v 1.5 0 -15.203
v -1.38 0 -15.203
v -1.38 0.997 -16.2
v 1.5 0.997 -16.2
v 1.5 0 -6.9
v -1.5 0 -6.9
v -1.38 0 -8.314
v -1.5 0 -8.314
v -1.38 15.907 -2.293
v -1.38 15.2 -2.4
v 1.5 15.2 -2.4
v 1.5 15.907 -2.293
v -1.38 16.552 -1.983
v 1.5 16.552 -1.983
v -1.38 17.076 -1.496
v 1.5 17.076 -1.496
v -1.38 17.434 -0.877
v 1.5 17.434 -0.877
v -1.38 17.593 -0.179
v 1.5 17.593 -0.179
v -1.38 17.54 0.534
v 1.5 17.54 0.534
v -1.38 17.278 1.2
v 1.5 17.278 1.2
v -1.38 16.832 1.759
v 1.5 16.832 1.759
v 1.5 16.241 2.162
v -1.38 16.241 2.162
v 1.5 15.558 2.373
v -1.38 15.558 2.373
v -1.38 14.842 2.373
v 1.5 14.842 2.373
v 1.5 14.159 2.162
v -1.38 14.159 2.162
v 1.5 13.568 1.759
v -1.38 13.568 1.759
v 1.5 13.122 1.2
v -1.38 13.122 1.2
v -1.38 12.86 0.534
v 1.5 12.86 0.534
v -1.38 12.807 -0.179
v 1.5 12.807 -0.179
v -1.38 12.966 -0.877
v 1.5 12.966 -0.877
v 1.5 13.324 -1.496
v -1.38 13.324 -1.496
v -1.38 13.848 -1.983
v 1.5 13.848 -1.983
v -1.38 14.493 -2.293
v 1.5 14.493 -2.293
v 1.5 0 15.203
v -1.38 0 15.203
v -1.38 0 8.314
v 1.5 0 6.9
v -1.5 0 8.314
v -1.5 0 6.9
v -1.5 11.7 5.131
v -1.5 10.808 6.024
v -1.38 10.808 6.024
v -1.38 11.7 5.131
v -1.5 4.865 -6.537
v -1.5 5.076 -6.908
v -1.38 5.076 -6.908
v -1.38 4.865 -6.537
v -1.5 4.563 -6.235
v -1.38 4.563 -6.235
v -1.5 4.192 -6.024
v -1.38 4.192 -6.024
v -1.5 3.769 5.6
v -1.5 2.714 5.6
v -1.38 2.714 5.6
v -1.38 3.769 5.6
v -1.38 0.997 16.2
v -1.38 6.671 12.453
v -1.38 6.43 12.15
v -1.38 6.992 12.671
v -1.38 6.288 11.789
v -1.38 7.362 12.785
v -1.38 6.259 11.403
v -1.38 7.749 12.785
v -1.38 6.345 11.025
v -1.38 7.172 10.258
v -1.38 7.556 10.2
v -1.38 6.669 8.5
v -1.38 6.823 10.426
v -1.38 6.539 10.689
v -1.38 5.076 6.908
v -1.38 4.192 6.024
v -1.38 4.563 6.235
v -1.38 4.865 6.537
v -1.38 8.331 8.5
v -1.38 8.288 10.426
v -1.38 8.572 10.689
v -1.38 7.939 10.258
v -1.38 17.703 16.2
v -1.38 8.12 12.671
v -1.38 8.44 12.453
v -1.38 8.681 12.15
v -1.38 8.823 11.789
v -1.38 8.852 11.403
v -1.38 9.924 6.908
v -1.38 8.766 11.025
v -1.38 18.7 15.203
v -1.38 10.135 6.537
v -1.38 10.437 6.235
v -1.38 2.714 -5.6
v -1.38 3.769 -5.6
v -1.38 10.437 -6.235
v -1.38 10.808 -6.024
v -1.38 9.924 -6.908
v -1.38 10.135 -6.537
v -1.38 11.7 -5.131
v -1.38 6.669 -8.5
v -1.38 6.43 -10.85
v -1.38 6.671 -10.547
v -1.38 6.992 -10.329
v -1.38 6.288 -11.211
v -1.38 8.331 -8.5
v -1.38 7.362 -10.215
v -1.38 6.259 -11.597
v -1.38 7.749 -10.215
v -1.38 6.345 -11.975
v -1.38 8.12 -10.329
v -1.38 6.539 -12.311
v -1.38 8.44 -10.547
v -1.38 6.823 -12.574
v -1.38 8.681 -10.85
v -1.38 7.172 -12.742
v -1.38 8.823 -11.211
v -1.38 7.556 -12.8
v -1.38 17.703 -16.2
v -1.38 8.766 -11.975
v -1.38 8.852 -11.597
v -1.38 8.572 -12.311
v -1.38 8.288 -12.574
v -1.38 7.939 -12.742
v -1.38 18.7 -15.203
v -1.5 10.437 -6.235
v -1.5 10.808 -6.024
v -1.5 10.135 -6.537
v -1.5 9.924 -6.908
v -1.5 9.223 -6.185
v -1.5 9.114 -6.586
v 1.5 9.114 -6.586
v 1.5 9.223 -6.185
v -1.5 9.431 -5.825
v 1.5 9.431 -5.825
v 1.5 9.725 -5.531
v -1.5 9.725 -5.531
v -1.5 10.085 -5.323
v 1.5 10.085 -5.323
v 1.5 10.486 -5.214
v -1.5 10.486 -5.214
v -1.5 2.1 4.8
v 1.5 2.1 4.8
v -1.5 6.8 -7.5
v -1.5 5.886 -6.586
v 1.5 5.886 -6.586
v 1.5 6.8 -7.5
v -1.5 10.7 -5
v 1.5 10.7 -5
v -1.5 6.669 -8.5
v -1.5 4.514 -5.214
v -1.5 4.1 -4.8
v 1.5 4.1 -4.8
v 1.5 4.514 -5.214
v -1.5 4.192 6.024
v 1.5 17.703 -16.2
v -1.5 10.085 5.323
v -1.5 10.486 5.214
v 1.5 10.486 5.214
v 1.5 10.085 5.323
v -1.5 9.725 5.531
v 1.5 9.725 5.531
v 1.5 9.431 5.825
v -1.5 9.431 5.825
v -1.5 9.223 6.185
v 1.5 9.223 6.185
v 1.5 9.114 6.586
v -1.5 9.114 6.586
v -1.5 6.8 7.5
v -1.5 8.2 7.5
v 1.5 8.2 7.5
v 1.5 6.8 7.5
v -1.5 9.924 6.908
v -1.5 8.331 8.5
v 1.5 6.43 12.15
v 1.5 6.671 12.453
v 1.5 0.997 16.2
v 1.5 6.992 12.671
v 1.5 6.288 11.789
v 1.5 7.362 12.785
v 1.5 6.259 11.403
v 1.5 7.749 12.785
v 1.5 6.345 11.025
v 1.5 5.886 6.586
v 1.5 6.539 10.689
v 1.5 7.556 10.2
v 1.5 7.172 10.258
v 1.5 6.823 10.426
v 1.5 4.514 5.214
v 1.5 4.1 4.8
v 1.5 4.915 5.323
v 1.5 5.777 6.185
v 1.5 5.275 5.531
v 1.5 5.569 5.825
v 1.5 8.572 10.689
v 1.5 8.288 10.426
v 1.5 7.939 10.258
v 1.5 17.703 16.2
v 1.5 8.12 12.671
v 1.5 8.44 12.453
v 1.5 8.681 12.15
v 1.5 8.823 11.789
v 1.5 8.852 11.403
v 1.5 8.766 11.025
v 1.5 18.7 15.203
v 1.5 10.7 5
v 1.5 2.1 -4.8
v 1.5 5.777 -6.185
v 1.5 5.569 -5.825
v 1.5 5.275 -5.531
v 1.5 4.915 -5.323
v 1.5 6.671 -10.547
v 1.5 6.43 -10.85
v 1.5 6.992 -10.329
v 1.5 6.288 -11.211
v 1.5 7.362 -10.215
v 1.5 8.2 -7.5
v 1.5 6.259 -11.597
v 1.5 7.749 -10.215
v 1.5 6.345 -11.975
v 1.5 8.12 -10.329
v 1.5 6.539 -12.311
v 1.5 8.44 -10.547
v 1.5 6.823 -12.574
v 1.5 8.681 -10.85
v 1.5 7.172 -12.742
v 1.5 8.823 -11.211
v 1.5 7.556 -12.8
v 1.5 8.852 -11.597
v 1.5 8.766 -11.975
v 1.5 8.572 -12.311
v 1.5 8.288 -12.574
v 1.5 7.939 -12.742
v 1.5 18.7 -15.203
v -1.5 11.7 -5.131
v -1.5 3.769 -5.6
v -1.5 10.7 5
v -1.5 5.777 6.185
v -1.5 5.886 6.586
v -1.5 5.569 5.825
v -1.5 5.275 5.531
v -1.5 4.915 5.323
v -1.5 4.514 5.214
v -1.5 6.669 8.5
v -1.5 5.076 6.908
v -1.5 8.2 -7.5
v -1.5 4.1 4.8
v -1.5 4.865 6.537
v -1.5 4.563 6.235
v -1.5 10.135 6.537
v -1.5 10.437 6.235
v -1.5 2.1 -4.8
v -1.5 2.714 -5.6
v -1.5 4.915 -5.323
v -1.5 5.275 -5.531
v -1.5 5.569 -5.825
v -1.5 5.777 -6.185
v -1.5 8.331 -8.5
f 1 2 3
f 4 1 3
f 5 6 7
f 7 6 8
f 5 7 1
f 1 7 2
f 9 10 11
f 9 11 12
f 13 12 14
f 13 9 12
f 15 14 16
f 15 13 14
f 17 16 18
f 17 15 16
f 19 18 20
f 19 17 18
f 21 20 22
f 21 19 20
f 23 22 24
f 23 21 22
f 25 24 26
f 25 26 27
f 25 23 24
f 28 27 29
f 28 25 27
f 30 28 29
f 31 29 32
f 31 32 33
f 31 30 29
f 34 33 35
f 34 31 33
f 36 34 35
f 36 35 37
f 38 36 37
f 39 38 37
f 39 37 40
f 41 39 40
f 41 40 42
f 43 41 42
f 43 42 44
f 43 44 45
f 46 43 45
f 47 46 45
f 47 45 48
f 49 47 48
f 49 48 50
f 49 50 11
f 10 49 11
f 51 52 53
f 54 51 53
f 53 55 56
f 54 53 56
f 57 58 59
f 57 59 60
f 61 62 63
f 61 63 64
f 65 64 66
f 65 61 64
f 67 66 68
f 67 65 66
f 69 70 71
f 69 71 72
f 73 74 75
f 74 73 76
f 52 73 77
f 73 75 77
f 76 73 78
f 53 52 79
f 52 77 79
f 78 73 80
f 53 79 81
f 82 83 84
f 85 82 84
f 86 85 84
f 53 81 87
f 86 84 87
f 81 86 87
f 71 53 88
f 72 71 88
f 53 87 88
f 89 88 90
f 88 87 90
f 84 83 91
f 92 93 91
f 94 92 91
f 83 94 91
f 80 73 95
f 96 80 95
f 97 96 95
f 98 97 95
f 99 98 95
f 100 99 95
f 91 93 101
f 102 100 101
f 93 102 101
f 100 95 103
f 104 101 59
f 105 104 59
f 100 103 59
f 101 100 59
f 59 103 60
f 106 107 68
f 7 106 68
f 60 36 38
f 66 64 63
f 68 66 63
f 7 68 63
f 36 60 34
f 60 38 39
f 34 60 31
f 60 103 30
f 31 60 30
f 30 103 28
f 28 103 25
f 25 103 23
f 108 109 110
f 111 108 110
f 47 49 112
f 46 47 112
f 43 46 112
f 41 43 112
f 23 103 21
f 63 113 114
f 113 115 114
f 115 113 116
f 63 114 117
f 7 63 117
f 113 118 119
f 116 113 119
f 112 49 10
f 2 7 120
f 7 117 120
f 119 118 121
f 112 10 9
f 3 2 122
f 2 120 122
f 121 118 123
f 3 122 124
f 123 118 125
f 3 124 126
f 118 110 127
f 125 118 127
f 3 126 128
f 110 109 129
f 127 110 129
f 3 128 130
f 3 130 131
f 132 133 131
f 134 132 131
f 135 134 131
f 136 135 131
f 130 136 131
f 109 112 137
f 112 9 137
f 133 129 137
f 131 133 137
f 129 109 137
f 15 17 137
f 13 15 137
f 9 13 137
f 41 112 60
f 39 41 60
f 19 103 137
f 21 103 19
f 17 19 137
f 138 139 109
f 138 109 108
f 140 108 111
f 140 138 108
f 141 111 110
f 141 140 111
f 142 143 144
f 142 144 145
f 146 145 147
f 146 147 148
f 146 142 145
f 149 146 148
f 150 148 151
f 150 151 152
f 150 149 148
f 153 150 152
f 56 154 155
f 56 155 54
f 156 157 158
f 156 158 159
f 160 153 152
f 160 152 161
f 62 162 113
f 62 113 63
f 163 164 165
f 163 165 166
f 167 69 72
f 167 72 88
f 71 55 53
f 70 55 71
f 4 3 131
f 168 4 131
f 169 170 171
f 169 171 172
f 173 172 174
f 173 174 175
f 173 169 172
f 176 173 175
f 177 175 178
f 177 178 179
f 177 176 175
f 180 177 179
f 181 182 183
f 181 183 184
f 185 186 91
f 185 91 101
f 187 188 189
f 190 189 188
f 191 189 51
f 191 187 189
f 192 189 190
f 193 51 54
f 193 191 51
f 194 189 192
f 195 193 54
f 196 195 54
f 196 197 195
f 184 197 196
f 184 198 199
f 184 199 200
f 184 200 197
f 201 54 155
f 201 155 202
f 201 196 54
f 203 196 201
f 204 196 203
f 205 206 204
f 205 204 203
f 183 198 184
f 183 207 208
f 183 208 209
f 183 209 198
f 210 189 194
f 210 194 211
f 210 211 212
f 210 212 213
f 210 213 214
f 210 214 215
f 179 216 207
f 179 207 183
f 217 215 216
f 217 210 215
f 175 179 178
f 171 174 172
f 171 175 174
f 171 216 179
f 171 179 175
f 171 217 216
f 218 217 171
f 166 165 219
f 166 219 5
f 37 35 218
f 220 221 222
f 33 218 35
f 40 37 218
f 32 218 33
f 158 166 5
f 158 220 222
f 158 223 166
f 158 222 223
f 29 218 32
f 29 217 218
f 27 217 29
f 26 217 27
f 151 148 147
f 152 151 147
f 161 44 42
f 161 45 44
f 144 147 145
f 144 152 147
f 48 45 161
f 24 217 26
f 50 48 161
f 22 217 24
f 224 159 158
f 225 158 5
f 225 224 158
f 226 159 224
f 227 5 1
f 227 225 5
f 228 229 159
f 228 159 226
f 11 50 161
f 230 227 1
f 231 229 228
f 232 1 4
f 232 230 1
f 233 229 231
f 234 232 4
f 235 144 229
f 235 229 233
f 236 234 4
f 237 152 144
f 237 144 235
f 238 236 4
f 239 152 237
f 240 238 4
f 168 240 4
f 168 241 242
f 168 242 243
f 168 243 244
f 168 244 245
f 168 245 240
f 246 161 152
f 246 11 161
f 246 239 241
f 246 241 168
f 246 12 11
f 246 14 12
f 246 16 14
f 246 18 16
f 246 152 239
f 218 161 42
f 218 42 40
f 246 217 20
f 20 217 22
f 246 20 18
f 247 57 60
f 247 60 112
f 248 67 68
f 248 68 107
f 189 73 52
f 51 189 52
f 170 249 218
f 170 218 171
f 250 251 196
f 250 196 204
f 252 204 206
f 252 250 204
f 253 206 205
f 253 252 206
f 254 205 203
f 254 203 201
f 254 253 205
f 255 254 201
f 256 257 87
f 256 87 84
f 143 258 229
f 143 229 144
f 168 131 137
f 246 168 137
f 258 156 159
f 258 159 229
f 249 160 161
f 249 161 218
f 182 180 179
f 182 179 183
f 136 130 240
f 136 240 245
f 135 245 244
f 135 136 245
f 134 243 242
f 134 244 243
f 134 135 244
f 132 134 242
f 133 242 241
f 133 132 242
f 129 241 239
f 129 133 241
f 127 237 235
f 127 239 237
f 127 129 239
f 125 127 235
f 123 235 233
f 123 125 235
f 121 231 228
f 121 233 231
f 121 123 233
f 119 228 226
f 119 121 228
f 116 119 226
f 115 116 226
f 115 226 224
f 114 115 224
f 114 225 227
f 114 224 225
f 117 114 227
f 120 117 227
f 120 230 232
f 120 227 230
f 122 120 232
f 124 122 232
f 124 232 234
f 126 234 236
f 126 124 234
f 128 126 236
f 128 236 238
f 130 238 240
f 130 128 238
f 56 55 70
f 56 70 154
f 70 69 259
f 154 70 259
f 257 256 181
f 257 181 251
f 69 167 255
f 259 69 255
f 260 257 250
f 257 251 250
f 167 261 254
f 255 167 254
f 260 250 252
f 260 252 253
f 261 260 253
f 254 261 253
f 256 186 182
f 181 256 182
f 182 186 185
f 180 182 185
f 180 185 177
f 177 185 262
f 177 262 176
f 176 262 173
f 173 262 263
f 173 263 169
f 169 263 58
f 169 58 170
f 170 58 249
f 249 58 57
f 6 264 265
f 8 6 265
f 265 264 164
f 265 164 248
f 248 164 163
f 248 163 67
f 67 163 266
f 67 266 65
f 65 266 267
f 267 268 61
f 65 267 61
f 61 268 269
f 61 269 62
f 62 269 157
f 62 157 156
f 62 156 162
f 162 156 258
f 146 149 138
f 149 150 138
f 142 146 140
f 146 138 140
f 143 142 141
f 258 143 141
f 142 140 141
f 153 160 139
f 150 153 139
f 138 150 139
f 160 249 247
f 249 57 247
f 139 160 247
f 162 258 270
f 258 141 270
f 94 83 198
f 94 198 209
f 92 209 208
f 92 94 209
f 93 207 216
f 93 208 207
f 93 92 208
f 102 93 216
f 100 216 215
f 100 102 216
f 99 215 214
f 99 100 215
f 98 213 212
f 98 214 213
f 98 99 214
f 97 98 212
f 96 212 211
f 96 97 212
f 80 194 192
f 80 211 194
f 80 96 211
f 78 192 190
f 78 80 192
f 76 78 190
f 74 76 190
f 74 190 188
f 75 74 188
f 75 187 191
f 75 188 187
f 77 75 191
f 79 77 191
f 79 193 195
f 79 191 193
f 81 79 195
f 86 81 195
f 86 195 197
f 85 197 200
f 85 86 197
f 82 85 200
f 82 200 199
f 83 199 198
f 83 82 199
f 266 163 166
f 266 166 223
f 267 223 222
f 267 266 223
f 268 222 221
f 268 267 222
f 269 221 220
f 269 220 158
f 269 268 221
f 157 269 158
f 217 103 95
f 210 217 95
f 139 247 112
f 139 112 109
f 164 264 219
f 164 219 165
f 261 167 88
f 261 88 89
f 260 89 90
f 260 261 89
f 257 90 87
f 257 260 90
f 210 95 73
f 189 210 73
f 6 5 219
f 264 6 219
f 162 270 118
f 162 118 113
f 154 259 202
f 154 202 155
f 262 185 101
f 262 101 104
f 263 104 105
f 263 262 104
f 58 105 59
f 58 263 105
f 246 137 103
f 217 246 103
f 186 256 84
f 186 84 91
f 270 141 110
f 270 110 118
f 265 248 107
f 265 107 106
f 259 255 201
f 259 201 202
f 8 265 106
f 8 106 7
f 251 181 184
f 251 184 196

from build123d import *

# Parameters (mm, degrees)
EXTRUDE_1_DEPTH          = 1.5
EXTRUDE_1_DEPTH_BACK     = 1.5
CUT_EXTRUDE_1_DEPTH      = 1.5
CUT_EXTRUDE_1_DEPTH_BACK = 1.5
CUT_EXTRUDE_2_DEPTH      = 0.12
SKETCH_4_R               = 2.4
CUT_EXTRUDE_3_DEPTH      = 3
CUT_EXTRUDE_4_DEPTH      = 3
CUT_EXTRUDE_4_DEPTH_BACK = 3
SKETCH_5_R               = 1.3
CUT_EXTRUDE_5_DEPTH      = 3
CUT_EXTRUDE_5_DEPTH_BACK = 3
SKETCH_6_R               = 1.3


with BuildPart() as part:
    # Эскиз1 → Бобышка-Вытянуть1 (new, two sides: drawn at the far end of the back side and taken through both)
    with BuildSketch(Plane(origin=(0, 0, 0), x_dir=(0, 0, -1), z_dir=(1, 0, 0)).offset(-EXTRUDE_1_DEPTH_BACK)):
        Polygon((-16.2, 0.997020561), (-15.202979439, 0), (15.202979439, 0), (16.2, 0.997020561), (16.2, 17.702979439), (15.202979439, 18.7), (-15.202979439, 18.7), (-16.2, 17.702979439), align=None)
    extrude(amount=EXTRUDE_1_DEPTH + EXTRUDE_1_DEPTH_BACK)

    # Эскиз2 → Вырез-Вытянуть1 (cut, two sides: drawn at the far end of the back side and taken through both)
    with BuildSketch(Plane(origin=(0, 0, 0), x_dir=(0, 0, -1), z_dir=(1, 0, 0)).offset(-CUT_EXTRUDE_1_DEPTH_BACK)):
        with BuildLine():
            Line((-11.2, -4.3), (11.2, -4.3))
            Line((11.2, -4.3), (4.8, 2.1))
            Line((4.8, 2.1), (4.8, 4.1))
            Line((4.8, 4.1), (5.21443454, 4.51443454))
            ThreePointArc((5.21443454, 4.51443454), (5.66862915, 5.43137085), (6.58556546, 5.88556546))
            Line((6.58556546, 5.88556546), (7.5, 6.8))
            Line((7.5, 6.8), (7.5, 8.2))
            Line((7.5, 8.2), (6.58556546, 9.11443454))
            ThreePointArc((6.58556546, 9.11443454), (5.66862915, 9.56862915), (5.21443454, 10.48556546))
            Line((5.21443454, 10.48556546), (5, 10.7))
            Line((5, 10.7), (-5, 10.7))
            Line((-5, 10.7), (-5.21443454, 10.48556546))
            ThreePointArc((-5.21443454, 10.48556546), (-5.66862915, 9.56862915), (-6.58556546, 9.11443454))
            Line((-6.58556546, 9.11443454), (-7.5, 8.2))
            Line((-7.5, 8.2), (-7.5, 6.8))
            Line((-7.5, 6.8), (-6.58556546, 5.88556546))
            ThreePointArc((-6.58556546, 5.88556546), (-5.66862915, 5.43137085), (-5.21443454, 4.51443454))
            Line((-5.21443454, 4.51443454), (-4.8, 4.1))
            Line((-4.8, 4.1), (-4.8, 2.1))
            Line((-4.8, 2.1), (-11.2, -4.3))
        make_face()
    extrude(amount=CUT_EXTRUDE_1_DEPTH + CUT_EXTRUDE_1_DEPTH_BACK, mode=Mode.SUBTRACT)

    # Эскиз3 → Вырез-Вытянуть2 (cut)
    with BuildSketch(Plane(origin=(-1.5, 0, 0), x_dir=(0, 0, -1), z_dir=(1, 0, 0))):
        with BuildLine():
            Line((-16.2, -4.3), (-12.614213562, -4.3))
            Line((-12.614213562, -4.3), (-5.6, 2.714213562))
            Line((-5.6, 2.714213562), (-5.6, 3.76862915))
            Line((-5.6, 3.76862915), (-6.023597697, 4.192226848))
            ThreePointArc((-6.023597697, 4.192226848), (-6.375735931, 4.724264069), (-6.907773152, 5.076402303))
            Line((-6.907773152, 5.076402303), (-8.5, 6.66862915))
            Line((-8.5, 6.66862915), (-8.5, 8.33137085))
            Line((-8.5, 8.33137085), (-6.907773152, 9.923597697))
            ThreePointArc((-6.907773152, 9.923597697), (-6.375735931, 10.275735931), (-6.023597697, 10.807773152))
            Line((-6.023597697, 10.807773152), (-5.13137085, 11.7))
            Line((-5.13137085, 11.7), (5.13137085, 11.7))
            Line((5.13137085, 11.7), (6.023597697, 10.807773152))
            ThreePointArc((6.023597697, 10.807773152), (6.375735931, 10.275735931), (6.907773152, 9.923597697))
            Line((6.907773152, 9.923597697), (8.5, 8.33137085))
            Line((8.5, 8.33137085), (8.5, 6.66862915))
            Line((8.5, 6.66862915), (6.907773152, 5.076402303))
            ThreePointArc((6.907773152, 5.076402303), (6.375735931, 4.724264069), (6.023597697, 4.192226848))
            Line((6.023597697, 4.192226848), (5.6, 3.76862915))
            Line((5.6, 3.76862915), (5.6, 2.714213562))
            Line((5.6, 2.714213562), (12.614213562, -4.3))
            Line((12.614213562, -4.3), (16.2, -4.3))
            Line((16.2, -4.3), (16.2, 18.7))
            Line((16.2, 18.7), (-16.2, 18.7))
            Line((-16.2, 18.7), (-16.2, -4.3))
        make_face()
    extrude(amount=CUT_EXTRUDE_2_DEPTH, mode=Mode.SUBTRACT)

    # Эскиз4 → Вырез-Вытянуть3 (cut)
    with BuildSketch(Plane(origin=(-1.5, 0, 0), x_dir=(0, 0, -1), z_dir=(1, 0, 0))):
        with Locations((0, 15.2)):
            Circle(SKETCH_4_R)
    extrude(amount=CUT_EXTRUDE_3_DEPTH, mode=Mode.SUBTRACT)

    # Эскиз5 → Вырез-Вытянуть4 (cut, two sides: drawn at the far end of the back side and taken through both)
    with BuildSketch(Plane(origin=(0, 0, 0), x_dir=(0, 0, -1), z_dir=(1, 0, 0)).offset(-CUT_EXTRUDE_4_DEPTH_BACK)):
        with Locations((-11.5, 7.555556)):
            Circle(SKETCH_5_R)
    extrude(amount=CUT_EXTRUDE_4_DEPTH + CUT_EXTRUDE_4_DEPTH_BACK, mode=Mode.SUBTRACT)

    # Эскиз6 → Вырез-Вытянуть5 (cut, two sides: drawn at the far end of the back side and taken through both)
    with BuildSketch(Plane(origin=(0, 0, 0), x_dir=(0, 0, -1), z_dir=(1, 0, 0)).offset(-CUT_EXTRUDE_5_DEPTH_BACK)):
        with Locations((11.5, 7.555556)):
            Circle(SKETCH_6_R)
    extrude(amount=CUT_EXTRUDE_5_DEPTH + CUT_EXTRUDE_5_DEPTH_BACK, mode=Mode.SUBTRACT)


solid = part.part
